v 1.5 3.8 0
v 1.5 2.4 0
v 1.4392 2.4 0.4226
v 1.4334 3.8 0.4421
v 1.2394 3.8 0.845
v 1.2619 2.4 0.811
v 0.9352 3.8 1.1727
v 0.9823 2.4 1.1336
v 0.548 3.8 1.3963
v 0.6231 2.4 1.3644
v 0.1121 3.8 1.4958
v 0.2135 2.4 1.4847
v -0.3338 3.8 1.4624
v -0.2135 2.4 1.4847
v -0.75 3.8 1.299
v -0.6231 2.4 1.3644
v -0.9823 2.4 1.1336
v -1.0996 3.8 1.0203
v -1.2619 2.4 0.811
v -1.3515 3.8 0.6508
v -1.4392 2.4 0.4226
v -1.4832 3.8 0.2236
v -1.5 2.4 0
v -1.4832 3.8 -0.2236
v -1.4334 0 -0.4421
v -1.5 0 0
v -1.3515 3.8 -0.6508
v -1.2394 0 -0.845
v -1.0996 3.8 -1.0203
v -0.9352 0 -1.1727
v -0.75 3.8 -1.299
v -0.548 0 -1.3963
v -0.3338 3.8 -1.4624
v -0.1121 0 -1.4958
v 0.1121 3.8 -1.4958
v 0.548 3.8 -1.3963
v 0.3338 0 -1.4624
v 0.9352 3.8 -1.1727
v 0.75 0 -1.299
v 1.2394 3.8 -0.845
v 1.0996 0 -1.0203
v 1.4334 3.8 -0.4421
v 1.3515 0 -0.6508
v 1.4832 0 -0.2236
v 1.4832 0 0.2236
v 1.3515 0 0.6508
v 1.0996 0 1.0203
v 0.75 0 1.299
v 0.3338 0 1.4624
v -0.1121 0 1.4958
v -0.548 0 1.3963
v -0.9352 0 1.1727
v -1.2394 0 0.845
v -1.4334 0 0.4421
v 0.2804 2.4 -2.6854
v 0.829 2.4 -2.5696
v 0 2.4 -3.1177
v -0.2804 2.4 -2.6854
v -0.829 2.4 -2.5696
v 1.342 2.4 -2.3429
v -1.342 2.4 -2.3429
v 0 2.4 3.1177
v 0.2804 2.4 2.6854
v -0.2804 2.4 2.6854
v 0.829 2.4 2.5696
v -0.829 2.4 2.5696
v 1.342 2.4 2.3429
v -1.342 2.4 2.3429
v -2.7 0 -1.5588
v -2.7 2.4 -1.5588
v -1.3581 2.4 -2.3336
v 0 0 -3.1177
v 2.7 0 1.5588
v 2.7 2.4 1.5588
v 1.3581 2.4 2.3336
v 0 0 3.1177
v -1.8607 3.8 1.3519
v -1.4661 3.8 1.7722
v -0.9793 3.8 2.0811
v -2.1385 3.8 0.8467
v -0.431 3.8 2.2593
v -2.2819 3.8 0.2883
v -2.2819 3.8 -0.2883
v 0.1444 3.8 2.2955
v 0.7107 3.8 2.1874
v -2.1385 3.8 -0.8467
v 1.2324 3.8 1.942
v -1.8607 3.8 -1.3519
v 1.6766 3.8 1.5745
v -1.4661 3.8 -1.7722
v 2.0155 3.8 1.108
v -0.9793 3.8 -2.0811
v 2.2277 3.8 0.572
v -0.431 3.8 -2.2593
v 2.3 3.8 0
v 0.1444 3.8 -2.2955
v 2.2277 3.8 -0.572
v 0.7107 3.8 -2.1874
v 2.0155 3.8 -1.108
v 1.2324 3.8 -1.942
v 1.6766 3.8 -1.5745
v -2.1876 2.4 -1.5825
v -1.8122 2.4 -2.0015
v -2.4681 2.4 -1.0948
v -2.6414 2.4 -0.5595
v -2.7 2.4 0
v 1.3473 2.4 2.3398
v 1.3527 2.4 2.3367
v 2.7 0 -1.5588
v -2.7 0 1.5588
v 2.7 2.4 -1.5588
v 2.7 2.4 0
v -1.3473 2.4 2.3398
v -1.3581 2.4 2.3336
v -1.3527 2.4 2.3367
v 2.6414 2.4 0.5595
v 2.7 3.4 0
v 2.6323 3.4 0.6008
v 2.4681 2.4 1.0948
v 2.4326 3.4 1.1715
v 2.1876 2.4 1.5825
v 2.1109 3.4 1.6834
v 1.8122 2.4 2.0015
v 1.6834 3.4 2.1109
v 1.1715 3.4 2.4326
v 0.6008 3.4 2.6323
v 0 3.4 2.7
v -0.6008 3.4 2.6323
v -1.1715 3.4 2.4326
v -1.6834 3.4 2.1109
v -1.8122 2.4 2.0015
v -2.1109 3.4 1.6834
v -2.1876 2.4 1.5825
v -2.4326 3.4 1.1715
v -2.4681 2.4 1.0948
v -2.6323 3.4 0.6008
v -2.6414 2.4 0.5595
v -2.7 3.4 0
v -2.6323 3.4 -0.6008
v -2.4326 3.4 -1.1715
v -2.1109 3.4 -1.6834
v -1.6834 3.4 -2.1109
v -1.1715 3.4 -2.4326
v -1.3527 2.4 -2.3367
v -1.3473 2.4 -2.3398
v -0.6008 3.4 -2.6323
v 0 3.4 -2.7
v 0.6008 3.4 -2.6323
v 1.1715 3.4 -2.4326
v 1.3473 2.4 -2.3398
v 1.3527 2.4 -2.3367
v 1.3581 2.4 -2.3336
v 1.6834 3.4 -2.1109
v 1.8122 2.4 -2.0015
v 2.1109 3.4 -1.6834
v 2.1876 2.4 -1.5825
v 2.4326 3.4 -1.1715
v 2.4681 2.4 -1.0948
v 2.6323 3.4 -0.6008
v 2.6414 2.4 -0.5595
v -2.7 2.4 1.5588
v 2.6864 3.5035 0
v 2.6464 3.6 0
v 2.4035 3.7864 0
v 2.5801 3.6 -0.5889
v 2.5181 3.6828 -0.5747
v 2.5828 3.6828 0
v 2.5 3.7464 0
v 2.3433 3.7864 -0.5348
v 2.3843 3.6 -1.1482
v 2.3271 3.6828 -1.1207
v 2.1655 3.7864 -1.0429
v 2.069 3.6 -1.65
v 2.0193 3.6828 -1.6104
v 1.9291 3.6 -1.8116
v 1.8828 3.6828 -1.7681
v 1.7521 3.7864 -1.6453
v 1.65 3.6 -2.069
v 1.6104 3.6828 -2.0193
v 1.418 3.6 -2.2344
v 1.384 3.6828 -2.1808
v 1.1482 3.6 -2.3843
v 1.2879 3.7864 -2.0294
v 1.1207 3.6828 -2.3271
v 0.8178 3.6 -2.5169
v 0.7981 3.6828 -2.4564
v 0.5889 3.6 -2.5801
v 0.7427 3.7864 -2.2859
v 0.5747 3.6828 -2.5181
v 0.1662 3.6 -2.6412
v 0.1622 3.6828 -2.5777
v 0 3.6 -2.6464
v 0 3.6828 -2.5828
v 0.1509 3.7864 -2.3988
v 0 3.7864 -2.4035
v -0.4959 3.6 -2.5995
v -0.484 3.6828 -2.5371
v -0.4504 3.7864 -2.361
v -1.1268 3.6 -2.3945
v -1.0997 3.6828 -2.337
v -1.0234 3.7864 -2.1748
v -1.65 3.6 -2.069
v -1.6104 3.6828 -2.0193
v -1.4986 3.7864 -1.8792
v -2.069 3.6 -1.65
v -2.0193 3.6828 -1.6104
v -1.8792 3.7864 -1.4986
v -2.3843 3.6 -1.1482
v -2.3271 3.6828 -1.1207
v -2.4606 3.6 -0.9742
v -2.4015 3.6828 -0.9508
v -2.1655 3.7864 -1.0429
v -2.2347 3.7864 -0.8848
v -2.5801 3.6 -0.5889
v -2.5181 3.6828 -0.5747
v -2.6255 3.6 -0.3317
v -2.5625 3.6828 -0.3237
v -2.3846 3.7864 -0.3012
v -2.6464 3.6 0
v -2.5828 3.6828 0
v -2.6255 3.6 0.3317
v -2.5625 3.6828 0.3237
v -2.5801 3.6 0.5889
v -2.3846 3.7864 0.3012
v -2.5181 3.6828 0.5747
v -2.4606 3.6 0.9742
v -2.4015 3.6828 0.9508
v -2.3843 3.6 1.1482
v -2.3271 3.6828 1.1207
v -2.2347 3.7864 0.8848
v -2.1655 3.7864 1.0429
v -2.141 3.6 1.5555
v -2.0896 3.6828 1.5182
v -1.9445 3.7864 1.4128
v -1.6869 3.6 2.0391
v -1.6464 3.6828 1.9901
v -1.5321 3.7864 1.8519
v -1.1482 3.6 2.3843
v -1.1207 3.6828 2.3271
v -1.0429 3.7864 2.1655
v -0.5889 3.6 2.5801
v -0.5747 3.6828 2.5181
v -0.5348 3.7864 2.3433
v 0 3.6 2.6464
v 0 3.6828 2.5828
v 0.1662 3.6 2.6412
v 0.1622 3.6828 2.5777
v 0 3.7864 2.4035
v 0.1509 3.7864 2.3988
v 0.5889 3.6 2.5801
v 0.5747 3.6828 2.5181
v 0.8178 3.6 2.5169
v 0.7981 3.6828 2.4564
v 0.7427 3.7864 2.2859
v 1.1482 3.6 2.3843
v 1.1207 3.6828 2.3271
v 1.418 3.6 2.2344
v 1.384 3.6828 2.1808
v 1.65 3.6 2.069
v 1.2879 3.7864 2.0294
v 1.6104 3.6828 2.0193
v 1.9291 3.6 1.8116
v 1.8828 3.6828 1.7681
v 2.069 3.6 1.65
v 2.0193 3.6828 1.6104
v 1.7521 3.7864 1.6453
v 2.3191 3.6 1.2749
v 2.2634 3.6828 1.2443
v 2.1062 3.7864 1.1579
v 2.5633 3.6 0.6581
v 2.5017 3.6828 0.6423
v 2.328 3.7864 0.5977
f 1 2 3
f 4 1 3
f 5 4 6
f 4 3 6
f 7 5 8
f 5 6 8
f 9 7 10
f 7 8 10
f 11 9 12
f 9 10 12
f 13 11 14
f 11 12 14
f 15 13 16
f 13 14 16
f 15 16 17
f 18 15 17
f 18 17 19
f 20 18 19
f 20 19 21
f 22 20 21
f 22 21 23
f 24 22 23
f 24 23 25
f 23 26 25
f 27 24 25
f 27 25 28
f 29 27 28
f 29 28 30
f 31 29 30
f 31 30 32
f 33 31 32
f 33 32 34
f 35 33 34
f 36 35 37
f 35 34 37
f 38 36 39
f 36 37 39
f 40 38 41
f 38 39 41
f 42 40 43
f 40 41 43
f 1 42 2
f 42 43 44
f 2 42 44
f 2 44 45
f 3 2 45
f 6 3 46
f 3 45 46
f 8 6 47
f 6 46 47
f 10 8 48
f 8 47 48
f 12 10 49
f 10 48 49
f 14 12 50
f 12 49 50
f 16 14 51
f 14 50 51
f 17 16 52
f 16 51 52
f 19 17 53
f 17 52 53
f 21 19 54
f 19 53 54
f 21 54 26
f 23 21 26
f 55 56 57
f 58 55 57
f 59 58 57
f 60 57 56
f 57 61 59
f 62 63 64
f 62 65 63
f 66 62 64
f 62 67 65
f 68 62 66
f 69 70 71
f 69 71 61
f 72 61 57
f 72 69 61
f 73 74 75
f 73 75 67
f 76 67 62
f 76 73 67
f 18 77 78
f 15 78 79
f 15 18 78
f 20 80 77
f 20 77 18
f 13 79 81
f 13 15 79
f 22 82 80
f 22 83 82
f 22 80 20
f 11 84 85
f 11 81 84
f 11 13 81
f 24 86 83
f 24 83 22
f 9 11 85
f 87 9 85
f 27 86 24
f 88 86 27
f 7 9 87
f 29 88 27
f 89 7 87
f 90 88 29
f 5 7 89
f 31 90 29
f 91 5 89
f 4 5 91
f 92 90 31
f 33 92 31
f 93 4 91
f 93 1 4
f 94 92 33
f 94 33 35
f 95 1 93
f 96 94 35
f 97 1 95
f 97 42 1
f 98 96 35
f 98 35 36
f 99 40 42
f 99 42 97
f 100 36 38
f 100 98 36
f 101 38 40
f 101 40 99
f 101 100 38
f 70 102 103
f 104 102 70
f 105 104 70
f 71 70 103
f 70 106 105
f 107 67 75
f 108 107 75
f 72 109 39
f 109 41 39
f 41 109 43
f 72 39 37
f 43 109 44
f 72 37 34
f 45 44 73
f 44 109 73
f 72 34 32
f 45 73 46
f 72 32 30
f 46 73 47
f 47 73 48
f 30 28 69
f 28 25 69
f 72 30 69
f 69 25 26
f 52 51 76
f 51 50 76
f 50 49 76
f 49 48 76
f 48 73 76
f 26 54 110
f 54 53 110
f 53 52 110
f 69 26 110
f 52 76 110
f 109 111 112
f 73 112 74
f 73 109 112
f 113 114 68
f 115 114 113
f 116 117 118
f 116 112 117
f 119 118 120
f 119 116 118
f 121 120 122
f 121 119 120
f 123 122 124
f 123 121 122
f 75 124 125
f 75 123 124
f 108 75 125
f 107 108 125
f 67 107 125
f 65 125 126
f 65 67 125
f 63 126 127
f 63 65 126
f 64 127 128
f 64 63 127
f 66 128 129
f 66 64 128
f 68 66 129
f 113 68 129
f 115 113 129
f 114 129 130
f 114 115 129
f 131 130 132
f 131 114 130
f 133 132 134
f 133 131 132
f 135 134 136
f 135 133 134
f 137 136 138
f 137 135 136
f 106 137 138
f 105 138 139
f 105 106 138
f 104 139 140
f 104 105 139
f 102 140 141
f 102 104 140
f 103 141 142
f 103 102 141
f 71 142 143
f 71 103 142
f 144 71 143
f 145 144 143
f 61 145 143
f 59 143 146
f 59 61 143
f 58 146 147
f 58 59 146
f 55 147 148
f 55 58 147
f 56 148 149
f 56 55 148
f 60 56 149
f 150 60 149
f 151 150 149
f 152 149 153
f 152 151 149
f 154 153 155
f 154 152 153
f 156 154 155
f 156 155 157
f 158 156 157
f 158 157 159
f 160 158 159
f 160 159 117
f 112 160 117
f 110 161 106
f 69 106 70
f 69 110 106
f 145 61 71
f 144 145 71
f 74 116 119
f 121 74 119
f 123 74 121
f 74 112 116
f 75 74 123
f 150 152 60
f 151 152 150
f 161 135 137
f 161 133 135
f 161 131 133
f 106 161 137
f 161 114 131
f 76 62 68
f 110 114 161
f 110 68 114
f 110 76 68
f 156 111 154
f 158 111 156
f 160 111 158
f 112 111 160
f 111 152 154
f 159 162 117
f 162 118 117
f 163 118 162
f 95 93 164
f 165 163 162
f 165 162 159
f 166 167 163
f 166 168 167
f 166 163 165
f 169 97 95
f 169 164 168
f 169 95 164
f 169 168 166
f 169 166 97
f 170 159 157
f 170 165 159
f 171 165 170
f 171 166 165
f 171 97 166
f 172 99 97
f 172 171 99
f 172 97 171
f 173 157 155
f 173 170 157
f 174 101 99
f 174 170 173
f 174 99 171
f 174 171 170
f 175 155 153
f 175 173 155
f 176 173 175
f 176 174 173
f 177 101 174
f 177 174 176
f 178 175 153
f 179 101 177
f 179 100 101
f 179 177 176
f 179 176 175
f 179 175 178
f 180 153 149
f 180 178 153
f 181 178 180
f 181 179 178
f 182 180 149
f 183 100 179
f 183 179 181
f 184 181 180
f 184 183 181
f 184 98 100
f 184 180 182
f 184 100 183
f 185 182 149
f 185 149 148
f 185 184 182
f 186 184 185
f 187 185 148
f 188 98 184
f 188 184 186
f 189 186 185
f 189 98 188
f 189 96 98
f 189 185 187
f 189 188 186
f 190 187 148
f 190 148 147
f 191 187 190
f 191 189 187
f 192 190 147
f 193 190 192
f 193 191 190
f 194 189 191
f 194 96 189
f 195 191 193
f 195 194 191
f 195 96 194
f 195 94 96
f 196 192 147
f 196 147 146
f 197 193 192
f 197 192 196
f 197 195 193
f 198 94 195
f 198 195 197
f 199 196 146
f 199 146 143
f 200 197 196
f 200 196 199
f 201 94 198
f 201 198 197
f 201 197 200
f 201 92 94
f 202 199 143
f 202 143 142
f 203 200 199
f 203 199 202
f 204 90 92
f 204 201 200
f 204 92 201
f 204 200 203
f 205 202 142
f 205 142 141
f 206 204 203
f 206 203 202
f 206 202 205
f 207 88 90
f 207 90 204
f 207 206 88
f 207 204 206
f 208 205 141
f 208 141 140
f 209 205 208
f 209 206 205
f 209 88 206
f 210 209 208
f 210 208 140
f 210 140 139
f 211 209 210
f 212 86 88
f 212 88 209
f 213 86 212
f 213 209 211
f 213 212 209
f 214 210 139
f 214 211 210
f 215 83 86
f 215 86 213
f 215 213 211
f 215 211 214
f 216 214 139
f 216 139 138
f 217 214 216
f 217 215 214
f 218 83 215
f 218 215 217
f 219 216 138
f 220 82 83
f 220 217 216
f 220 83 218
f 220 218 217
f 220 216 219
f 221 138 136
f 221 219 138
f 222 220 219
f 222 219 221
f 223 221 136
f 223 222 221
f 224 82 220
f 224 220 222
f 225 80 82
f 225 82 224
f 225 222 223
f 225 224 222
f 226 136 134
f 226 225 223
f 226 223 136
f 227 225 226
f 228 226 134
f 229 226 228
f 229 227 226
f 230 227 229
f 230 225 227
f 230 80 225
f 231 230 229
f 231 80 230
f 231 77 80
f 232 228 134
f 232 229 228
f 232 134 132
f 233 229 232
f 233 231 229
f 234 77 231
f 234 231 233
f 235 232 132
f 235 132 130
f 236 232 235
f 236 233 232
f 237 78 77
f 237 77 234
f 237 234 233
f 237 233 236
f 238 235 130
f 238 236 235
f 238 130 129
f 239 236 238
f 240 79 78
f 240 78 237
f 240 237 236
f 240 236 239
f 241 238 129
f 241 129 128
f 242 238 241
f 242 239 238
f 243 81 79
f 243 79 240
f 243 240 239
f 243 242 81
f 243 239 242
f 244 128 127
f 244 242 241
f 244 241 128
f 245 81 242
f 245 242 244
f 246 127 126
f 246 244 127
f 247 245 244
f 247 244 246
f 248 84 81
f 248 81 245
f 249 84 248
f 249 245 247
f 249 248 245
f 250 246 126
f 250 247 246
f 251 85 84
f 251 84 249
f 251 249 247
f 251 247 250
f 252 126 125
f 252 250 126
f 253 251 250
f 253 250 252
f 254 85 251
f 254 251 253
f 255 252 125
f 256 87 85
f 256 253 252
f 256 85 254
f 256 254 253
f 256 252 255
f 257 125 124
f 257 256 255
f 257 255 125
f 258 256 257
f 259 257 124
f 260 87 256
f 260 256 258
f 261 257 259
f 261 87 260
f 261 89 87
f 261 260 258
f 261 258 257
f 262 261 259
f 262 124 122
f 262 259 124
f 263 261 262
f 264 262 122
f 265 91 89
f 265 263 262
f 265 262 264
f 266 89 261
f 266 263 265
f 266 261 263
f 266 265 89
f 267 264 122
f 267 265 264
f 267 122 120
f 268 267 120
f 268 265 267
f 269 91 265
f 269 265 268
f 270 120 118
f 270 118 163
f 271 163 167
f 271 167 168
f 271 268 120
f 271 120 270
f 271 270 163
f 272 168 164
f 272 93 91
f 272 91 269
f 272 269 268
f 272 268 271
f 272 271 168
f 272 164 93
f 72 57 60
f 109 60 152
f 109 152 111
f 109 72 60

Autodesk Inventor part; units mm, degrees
ref_plane "YZ Plane" through (0, 0, 0) normal (1, 0, 0) x (0, 1, 0)
ref_plane "XZ Plane" through (0, 0, 0) normal (0, 1, 0) x (-1, 0, 0)
ref_plane "XY Plane" through (0, 0, 0) normal (0, 0, 1) x (1, 0, 0)
sketch "Sketch1" plane through (0, 0, 0) normal (0, 1, 0) x (-1, 0, 0)
  line L0 (0, -3.1177) -> (-2.7, -1.5588)
  line L1 (-2.7, -1.5588) -> (-2.7, 1.5588)
  line L2 (-2.7, 1.5588) -> (0, 3.1177)
  line L3 (0, 3.1177) -> (2.7, 1.5588)
  line L4 (2.7, 1.5588) -> (2.7, -1.5588)
  line L5 (2.7, -1.5588) -> (0, -3.1177)
  circle A0 centre (0, 0) radius 1.5
  dimension "d0" = 5.4
  dimension "d1" = 3
extrude "Extrusion1" add sketch "Sketch1" along normal blind 2.4
sketch "Sketch2" plane through (0, 2.4, 0) normal (0, 1, 0) x (1, 0, 0)
  circle A0 centre (0, 0) radius 2.7
  line L0 (2.7, -1.5588) -> (2.7, 1.5588) projected
  line L1 (-2.7, 1.5588) -> (-2.7, -1.5588) projected
  circle A1 centre (0, 0) radius 1.5 projected
  dimension "d4" = 5.4
  dimension "d5" = 5.4
extrude "Extrusion2" add sketch "Sketch2" along normal blind 1.4
fillet "Fillet1" radius 0.4 1 edges at (-2.7, 3.8, 0)
equation "\"d5\" = d4"
properties part number "m3_nut_locking" material "Stainless Steel"
